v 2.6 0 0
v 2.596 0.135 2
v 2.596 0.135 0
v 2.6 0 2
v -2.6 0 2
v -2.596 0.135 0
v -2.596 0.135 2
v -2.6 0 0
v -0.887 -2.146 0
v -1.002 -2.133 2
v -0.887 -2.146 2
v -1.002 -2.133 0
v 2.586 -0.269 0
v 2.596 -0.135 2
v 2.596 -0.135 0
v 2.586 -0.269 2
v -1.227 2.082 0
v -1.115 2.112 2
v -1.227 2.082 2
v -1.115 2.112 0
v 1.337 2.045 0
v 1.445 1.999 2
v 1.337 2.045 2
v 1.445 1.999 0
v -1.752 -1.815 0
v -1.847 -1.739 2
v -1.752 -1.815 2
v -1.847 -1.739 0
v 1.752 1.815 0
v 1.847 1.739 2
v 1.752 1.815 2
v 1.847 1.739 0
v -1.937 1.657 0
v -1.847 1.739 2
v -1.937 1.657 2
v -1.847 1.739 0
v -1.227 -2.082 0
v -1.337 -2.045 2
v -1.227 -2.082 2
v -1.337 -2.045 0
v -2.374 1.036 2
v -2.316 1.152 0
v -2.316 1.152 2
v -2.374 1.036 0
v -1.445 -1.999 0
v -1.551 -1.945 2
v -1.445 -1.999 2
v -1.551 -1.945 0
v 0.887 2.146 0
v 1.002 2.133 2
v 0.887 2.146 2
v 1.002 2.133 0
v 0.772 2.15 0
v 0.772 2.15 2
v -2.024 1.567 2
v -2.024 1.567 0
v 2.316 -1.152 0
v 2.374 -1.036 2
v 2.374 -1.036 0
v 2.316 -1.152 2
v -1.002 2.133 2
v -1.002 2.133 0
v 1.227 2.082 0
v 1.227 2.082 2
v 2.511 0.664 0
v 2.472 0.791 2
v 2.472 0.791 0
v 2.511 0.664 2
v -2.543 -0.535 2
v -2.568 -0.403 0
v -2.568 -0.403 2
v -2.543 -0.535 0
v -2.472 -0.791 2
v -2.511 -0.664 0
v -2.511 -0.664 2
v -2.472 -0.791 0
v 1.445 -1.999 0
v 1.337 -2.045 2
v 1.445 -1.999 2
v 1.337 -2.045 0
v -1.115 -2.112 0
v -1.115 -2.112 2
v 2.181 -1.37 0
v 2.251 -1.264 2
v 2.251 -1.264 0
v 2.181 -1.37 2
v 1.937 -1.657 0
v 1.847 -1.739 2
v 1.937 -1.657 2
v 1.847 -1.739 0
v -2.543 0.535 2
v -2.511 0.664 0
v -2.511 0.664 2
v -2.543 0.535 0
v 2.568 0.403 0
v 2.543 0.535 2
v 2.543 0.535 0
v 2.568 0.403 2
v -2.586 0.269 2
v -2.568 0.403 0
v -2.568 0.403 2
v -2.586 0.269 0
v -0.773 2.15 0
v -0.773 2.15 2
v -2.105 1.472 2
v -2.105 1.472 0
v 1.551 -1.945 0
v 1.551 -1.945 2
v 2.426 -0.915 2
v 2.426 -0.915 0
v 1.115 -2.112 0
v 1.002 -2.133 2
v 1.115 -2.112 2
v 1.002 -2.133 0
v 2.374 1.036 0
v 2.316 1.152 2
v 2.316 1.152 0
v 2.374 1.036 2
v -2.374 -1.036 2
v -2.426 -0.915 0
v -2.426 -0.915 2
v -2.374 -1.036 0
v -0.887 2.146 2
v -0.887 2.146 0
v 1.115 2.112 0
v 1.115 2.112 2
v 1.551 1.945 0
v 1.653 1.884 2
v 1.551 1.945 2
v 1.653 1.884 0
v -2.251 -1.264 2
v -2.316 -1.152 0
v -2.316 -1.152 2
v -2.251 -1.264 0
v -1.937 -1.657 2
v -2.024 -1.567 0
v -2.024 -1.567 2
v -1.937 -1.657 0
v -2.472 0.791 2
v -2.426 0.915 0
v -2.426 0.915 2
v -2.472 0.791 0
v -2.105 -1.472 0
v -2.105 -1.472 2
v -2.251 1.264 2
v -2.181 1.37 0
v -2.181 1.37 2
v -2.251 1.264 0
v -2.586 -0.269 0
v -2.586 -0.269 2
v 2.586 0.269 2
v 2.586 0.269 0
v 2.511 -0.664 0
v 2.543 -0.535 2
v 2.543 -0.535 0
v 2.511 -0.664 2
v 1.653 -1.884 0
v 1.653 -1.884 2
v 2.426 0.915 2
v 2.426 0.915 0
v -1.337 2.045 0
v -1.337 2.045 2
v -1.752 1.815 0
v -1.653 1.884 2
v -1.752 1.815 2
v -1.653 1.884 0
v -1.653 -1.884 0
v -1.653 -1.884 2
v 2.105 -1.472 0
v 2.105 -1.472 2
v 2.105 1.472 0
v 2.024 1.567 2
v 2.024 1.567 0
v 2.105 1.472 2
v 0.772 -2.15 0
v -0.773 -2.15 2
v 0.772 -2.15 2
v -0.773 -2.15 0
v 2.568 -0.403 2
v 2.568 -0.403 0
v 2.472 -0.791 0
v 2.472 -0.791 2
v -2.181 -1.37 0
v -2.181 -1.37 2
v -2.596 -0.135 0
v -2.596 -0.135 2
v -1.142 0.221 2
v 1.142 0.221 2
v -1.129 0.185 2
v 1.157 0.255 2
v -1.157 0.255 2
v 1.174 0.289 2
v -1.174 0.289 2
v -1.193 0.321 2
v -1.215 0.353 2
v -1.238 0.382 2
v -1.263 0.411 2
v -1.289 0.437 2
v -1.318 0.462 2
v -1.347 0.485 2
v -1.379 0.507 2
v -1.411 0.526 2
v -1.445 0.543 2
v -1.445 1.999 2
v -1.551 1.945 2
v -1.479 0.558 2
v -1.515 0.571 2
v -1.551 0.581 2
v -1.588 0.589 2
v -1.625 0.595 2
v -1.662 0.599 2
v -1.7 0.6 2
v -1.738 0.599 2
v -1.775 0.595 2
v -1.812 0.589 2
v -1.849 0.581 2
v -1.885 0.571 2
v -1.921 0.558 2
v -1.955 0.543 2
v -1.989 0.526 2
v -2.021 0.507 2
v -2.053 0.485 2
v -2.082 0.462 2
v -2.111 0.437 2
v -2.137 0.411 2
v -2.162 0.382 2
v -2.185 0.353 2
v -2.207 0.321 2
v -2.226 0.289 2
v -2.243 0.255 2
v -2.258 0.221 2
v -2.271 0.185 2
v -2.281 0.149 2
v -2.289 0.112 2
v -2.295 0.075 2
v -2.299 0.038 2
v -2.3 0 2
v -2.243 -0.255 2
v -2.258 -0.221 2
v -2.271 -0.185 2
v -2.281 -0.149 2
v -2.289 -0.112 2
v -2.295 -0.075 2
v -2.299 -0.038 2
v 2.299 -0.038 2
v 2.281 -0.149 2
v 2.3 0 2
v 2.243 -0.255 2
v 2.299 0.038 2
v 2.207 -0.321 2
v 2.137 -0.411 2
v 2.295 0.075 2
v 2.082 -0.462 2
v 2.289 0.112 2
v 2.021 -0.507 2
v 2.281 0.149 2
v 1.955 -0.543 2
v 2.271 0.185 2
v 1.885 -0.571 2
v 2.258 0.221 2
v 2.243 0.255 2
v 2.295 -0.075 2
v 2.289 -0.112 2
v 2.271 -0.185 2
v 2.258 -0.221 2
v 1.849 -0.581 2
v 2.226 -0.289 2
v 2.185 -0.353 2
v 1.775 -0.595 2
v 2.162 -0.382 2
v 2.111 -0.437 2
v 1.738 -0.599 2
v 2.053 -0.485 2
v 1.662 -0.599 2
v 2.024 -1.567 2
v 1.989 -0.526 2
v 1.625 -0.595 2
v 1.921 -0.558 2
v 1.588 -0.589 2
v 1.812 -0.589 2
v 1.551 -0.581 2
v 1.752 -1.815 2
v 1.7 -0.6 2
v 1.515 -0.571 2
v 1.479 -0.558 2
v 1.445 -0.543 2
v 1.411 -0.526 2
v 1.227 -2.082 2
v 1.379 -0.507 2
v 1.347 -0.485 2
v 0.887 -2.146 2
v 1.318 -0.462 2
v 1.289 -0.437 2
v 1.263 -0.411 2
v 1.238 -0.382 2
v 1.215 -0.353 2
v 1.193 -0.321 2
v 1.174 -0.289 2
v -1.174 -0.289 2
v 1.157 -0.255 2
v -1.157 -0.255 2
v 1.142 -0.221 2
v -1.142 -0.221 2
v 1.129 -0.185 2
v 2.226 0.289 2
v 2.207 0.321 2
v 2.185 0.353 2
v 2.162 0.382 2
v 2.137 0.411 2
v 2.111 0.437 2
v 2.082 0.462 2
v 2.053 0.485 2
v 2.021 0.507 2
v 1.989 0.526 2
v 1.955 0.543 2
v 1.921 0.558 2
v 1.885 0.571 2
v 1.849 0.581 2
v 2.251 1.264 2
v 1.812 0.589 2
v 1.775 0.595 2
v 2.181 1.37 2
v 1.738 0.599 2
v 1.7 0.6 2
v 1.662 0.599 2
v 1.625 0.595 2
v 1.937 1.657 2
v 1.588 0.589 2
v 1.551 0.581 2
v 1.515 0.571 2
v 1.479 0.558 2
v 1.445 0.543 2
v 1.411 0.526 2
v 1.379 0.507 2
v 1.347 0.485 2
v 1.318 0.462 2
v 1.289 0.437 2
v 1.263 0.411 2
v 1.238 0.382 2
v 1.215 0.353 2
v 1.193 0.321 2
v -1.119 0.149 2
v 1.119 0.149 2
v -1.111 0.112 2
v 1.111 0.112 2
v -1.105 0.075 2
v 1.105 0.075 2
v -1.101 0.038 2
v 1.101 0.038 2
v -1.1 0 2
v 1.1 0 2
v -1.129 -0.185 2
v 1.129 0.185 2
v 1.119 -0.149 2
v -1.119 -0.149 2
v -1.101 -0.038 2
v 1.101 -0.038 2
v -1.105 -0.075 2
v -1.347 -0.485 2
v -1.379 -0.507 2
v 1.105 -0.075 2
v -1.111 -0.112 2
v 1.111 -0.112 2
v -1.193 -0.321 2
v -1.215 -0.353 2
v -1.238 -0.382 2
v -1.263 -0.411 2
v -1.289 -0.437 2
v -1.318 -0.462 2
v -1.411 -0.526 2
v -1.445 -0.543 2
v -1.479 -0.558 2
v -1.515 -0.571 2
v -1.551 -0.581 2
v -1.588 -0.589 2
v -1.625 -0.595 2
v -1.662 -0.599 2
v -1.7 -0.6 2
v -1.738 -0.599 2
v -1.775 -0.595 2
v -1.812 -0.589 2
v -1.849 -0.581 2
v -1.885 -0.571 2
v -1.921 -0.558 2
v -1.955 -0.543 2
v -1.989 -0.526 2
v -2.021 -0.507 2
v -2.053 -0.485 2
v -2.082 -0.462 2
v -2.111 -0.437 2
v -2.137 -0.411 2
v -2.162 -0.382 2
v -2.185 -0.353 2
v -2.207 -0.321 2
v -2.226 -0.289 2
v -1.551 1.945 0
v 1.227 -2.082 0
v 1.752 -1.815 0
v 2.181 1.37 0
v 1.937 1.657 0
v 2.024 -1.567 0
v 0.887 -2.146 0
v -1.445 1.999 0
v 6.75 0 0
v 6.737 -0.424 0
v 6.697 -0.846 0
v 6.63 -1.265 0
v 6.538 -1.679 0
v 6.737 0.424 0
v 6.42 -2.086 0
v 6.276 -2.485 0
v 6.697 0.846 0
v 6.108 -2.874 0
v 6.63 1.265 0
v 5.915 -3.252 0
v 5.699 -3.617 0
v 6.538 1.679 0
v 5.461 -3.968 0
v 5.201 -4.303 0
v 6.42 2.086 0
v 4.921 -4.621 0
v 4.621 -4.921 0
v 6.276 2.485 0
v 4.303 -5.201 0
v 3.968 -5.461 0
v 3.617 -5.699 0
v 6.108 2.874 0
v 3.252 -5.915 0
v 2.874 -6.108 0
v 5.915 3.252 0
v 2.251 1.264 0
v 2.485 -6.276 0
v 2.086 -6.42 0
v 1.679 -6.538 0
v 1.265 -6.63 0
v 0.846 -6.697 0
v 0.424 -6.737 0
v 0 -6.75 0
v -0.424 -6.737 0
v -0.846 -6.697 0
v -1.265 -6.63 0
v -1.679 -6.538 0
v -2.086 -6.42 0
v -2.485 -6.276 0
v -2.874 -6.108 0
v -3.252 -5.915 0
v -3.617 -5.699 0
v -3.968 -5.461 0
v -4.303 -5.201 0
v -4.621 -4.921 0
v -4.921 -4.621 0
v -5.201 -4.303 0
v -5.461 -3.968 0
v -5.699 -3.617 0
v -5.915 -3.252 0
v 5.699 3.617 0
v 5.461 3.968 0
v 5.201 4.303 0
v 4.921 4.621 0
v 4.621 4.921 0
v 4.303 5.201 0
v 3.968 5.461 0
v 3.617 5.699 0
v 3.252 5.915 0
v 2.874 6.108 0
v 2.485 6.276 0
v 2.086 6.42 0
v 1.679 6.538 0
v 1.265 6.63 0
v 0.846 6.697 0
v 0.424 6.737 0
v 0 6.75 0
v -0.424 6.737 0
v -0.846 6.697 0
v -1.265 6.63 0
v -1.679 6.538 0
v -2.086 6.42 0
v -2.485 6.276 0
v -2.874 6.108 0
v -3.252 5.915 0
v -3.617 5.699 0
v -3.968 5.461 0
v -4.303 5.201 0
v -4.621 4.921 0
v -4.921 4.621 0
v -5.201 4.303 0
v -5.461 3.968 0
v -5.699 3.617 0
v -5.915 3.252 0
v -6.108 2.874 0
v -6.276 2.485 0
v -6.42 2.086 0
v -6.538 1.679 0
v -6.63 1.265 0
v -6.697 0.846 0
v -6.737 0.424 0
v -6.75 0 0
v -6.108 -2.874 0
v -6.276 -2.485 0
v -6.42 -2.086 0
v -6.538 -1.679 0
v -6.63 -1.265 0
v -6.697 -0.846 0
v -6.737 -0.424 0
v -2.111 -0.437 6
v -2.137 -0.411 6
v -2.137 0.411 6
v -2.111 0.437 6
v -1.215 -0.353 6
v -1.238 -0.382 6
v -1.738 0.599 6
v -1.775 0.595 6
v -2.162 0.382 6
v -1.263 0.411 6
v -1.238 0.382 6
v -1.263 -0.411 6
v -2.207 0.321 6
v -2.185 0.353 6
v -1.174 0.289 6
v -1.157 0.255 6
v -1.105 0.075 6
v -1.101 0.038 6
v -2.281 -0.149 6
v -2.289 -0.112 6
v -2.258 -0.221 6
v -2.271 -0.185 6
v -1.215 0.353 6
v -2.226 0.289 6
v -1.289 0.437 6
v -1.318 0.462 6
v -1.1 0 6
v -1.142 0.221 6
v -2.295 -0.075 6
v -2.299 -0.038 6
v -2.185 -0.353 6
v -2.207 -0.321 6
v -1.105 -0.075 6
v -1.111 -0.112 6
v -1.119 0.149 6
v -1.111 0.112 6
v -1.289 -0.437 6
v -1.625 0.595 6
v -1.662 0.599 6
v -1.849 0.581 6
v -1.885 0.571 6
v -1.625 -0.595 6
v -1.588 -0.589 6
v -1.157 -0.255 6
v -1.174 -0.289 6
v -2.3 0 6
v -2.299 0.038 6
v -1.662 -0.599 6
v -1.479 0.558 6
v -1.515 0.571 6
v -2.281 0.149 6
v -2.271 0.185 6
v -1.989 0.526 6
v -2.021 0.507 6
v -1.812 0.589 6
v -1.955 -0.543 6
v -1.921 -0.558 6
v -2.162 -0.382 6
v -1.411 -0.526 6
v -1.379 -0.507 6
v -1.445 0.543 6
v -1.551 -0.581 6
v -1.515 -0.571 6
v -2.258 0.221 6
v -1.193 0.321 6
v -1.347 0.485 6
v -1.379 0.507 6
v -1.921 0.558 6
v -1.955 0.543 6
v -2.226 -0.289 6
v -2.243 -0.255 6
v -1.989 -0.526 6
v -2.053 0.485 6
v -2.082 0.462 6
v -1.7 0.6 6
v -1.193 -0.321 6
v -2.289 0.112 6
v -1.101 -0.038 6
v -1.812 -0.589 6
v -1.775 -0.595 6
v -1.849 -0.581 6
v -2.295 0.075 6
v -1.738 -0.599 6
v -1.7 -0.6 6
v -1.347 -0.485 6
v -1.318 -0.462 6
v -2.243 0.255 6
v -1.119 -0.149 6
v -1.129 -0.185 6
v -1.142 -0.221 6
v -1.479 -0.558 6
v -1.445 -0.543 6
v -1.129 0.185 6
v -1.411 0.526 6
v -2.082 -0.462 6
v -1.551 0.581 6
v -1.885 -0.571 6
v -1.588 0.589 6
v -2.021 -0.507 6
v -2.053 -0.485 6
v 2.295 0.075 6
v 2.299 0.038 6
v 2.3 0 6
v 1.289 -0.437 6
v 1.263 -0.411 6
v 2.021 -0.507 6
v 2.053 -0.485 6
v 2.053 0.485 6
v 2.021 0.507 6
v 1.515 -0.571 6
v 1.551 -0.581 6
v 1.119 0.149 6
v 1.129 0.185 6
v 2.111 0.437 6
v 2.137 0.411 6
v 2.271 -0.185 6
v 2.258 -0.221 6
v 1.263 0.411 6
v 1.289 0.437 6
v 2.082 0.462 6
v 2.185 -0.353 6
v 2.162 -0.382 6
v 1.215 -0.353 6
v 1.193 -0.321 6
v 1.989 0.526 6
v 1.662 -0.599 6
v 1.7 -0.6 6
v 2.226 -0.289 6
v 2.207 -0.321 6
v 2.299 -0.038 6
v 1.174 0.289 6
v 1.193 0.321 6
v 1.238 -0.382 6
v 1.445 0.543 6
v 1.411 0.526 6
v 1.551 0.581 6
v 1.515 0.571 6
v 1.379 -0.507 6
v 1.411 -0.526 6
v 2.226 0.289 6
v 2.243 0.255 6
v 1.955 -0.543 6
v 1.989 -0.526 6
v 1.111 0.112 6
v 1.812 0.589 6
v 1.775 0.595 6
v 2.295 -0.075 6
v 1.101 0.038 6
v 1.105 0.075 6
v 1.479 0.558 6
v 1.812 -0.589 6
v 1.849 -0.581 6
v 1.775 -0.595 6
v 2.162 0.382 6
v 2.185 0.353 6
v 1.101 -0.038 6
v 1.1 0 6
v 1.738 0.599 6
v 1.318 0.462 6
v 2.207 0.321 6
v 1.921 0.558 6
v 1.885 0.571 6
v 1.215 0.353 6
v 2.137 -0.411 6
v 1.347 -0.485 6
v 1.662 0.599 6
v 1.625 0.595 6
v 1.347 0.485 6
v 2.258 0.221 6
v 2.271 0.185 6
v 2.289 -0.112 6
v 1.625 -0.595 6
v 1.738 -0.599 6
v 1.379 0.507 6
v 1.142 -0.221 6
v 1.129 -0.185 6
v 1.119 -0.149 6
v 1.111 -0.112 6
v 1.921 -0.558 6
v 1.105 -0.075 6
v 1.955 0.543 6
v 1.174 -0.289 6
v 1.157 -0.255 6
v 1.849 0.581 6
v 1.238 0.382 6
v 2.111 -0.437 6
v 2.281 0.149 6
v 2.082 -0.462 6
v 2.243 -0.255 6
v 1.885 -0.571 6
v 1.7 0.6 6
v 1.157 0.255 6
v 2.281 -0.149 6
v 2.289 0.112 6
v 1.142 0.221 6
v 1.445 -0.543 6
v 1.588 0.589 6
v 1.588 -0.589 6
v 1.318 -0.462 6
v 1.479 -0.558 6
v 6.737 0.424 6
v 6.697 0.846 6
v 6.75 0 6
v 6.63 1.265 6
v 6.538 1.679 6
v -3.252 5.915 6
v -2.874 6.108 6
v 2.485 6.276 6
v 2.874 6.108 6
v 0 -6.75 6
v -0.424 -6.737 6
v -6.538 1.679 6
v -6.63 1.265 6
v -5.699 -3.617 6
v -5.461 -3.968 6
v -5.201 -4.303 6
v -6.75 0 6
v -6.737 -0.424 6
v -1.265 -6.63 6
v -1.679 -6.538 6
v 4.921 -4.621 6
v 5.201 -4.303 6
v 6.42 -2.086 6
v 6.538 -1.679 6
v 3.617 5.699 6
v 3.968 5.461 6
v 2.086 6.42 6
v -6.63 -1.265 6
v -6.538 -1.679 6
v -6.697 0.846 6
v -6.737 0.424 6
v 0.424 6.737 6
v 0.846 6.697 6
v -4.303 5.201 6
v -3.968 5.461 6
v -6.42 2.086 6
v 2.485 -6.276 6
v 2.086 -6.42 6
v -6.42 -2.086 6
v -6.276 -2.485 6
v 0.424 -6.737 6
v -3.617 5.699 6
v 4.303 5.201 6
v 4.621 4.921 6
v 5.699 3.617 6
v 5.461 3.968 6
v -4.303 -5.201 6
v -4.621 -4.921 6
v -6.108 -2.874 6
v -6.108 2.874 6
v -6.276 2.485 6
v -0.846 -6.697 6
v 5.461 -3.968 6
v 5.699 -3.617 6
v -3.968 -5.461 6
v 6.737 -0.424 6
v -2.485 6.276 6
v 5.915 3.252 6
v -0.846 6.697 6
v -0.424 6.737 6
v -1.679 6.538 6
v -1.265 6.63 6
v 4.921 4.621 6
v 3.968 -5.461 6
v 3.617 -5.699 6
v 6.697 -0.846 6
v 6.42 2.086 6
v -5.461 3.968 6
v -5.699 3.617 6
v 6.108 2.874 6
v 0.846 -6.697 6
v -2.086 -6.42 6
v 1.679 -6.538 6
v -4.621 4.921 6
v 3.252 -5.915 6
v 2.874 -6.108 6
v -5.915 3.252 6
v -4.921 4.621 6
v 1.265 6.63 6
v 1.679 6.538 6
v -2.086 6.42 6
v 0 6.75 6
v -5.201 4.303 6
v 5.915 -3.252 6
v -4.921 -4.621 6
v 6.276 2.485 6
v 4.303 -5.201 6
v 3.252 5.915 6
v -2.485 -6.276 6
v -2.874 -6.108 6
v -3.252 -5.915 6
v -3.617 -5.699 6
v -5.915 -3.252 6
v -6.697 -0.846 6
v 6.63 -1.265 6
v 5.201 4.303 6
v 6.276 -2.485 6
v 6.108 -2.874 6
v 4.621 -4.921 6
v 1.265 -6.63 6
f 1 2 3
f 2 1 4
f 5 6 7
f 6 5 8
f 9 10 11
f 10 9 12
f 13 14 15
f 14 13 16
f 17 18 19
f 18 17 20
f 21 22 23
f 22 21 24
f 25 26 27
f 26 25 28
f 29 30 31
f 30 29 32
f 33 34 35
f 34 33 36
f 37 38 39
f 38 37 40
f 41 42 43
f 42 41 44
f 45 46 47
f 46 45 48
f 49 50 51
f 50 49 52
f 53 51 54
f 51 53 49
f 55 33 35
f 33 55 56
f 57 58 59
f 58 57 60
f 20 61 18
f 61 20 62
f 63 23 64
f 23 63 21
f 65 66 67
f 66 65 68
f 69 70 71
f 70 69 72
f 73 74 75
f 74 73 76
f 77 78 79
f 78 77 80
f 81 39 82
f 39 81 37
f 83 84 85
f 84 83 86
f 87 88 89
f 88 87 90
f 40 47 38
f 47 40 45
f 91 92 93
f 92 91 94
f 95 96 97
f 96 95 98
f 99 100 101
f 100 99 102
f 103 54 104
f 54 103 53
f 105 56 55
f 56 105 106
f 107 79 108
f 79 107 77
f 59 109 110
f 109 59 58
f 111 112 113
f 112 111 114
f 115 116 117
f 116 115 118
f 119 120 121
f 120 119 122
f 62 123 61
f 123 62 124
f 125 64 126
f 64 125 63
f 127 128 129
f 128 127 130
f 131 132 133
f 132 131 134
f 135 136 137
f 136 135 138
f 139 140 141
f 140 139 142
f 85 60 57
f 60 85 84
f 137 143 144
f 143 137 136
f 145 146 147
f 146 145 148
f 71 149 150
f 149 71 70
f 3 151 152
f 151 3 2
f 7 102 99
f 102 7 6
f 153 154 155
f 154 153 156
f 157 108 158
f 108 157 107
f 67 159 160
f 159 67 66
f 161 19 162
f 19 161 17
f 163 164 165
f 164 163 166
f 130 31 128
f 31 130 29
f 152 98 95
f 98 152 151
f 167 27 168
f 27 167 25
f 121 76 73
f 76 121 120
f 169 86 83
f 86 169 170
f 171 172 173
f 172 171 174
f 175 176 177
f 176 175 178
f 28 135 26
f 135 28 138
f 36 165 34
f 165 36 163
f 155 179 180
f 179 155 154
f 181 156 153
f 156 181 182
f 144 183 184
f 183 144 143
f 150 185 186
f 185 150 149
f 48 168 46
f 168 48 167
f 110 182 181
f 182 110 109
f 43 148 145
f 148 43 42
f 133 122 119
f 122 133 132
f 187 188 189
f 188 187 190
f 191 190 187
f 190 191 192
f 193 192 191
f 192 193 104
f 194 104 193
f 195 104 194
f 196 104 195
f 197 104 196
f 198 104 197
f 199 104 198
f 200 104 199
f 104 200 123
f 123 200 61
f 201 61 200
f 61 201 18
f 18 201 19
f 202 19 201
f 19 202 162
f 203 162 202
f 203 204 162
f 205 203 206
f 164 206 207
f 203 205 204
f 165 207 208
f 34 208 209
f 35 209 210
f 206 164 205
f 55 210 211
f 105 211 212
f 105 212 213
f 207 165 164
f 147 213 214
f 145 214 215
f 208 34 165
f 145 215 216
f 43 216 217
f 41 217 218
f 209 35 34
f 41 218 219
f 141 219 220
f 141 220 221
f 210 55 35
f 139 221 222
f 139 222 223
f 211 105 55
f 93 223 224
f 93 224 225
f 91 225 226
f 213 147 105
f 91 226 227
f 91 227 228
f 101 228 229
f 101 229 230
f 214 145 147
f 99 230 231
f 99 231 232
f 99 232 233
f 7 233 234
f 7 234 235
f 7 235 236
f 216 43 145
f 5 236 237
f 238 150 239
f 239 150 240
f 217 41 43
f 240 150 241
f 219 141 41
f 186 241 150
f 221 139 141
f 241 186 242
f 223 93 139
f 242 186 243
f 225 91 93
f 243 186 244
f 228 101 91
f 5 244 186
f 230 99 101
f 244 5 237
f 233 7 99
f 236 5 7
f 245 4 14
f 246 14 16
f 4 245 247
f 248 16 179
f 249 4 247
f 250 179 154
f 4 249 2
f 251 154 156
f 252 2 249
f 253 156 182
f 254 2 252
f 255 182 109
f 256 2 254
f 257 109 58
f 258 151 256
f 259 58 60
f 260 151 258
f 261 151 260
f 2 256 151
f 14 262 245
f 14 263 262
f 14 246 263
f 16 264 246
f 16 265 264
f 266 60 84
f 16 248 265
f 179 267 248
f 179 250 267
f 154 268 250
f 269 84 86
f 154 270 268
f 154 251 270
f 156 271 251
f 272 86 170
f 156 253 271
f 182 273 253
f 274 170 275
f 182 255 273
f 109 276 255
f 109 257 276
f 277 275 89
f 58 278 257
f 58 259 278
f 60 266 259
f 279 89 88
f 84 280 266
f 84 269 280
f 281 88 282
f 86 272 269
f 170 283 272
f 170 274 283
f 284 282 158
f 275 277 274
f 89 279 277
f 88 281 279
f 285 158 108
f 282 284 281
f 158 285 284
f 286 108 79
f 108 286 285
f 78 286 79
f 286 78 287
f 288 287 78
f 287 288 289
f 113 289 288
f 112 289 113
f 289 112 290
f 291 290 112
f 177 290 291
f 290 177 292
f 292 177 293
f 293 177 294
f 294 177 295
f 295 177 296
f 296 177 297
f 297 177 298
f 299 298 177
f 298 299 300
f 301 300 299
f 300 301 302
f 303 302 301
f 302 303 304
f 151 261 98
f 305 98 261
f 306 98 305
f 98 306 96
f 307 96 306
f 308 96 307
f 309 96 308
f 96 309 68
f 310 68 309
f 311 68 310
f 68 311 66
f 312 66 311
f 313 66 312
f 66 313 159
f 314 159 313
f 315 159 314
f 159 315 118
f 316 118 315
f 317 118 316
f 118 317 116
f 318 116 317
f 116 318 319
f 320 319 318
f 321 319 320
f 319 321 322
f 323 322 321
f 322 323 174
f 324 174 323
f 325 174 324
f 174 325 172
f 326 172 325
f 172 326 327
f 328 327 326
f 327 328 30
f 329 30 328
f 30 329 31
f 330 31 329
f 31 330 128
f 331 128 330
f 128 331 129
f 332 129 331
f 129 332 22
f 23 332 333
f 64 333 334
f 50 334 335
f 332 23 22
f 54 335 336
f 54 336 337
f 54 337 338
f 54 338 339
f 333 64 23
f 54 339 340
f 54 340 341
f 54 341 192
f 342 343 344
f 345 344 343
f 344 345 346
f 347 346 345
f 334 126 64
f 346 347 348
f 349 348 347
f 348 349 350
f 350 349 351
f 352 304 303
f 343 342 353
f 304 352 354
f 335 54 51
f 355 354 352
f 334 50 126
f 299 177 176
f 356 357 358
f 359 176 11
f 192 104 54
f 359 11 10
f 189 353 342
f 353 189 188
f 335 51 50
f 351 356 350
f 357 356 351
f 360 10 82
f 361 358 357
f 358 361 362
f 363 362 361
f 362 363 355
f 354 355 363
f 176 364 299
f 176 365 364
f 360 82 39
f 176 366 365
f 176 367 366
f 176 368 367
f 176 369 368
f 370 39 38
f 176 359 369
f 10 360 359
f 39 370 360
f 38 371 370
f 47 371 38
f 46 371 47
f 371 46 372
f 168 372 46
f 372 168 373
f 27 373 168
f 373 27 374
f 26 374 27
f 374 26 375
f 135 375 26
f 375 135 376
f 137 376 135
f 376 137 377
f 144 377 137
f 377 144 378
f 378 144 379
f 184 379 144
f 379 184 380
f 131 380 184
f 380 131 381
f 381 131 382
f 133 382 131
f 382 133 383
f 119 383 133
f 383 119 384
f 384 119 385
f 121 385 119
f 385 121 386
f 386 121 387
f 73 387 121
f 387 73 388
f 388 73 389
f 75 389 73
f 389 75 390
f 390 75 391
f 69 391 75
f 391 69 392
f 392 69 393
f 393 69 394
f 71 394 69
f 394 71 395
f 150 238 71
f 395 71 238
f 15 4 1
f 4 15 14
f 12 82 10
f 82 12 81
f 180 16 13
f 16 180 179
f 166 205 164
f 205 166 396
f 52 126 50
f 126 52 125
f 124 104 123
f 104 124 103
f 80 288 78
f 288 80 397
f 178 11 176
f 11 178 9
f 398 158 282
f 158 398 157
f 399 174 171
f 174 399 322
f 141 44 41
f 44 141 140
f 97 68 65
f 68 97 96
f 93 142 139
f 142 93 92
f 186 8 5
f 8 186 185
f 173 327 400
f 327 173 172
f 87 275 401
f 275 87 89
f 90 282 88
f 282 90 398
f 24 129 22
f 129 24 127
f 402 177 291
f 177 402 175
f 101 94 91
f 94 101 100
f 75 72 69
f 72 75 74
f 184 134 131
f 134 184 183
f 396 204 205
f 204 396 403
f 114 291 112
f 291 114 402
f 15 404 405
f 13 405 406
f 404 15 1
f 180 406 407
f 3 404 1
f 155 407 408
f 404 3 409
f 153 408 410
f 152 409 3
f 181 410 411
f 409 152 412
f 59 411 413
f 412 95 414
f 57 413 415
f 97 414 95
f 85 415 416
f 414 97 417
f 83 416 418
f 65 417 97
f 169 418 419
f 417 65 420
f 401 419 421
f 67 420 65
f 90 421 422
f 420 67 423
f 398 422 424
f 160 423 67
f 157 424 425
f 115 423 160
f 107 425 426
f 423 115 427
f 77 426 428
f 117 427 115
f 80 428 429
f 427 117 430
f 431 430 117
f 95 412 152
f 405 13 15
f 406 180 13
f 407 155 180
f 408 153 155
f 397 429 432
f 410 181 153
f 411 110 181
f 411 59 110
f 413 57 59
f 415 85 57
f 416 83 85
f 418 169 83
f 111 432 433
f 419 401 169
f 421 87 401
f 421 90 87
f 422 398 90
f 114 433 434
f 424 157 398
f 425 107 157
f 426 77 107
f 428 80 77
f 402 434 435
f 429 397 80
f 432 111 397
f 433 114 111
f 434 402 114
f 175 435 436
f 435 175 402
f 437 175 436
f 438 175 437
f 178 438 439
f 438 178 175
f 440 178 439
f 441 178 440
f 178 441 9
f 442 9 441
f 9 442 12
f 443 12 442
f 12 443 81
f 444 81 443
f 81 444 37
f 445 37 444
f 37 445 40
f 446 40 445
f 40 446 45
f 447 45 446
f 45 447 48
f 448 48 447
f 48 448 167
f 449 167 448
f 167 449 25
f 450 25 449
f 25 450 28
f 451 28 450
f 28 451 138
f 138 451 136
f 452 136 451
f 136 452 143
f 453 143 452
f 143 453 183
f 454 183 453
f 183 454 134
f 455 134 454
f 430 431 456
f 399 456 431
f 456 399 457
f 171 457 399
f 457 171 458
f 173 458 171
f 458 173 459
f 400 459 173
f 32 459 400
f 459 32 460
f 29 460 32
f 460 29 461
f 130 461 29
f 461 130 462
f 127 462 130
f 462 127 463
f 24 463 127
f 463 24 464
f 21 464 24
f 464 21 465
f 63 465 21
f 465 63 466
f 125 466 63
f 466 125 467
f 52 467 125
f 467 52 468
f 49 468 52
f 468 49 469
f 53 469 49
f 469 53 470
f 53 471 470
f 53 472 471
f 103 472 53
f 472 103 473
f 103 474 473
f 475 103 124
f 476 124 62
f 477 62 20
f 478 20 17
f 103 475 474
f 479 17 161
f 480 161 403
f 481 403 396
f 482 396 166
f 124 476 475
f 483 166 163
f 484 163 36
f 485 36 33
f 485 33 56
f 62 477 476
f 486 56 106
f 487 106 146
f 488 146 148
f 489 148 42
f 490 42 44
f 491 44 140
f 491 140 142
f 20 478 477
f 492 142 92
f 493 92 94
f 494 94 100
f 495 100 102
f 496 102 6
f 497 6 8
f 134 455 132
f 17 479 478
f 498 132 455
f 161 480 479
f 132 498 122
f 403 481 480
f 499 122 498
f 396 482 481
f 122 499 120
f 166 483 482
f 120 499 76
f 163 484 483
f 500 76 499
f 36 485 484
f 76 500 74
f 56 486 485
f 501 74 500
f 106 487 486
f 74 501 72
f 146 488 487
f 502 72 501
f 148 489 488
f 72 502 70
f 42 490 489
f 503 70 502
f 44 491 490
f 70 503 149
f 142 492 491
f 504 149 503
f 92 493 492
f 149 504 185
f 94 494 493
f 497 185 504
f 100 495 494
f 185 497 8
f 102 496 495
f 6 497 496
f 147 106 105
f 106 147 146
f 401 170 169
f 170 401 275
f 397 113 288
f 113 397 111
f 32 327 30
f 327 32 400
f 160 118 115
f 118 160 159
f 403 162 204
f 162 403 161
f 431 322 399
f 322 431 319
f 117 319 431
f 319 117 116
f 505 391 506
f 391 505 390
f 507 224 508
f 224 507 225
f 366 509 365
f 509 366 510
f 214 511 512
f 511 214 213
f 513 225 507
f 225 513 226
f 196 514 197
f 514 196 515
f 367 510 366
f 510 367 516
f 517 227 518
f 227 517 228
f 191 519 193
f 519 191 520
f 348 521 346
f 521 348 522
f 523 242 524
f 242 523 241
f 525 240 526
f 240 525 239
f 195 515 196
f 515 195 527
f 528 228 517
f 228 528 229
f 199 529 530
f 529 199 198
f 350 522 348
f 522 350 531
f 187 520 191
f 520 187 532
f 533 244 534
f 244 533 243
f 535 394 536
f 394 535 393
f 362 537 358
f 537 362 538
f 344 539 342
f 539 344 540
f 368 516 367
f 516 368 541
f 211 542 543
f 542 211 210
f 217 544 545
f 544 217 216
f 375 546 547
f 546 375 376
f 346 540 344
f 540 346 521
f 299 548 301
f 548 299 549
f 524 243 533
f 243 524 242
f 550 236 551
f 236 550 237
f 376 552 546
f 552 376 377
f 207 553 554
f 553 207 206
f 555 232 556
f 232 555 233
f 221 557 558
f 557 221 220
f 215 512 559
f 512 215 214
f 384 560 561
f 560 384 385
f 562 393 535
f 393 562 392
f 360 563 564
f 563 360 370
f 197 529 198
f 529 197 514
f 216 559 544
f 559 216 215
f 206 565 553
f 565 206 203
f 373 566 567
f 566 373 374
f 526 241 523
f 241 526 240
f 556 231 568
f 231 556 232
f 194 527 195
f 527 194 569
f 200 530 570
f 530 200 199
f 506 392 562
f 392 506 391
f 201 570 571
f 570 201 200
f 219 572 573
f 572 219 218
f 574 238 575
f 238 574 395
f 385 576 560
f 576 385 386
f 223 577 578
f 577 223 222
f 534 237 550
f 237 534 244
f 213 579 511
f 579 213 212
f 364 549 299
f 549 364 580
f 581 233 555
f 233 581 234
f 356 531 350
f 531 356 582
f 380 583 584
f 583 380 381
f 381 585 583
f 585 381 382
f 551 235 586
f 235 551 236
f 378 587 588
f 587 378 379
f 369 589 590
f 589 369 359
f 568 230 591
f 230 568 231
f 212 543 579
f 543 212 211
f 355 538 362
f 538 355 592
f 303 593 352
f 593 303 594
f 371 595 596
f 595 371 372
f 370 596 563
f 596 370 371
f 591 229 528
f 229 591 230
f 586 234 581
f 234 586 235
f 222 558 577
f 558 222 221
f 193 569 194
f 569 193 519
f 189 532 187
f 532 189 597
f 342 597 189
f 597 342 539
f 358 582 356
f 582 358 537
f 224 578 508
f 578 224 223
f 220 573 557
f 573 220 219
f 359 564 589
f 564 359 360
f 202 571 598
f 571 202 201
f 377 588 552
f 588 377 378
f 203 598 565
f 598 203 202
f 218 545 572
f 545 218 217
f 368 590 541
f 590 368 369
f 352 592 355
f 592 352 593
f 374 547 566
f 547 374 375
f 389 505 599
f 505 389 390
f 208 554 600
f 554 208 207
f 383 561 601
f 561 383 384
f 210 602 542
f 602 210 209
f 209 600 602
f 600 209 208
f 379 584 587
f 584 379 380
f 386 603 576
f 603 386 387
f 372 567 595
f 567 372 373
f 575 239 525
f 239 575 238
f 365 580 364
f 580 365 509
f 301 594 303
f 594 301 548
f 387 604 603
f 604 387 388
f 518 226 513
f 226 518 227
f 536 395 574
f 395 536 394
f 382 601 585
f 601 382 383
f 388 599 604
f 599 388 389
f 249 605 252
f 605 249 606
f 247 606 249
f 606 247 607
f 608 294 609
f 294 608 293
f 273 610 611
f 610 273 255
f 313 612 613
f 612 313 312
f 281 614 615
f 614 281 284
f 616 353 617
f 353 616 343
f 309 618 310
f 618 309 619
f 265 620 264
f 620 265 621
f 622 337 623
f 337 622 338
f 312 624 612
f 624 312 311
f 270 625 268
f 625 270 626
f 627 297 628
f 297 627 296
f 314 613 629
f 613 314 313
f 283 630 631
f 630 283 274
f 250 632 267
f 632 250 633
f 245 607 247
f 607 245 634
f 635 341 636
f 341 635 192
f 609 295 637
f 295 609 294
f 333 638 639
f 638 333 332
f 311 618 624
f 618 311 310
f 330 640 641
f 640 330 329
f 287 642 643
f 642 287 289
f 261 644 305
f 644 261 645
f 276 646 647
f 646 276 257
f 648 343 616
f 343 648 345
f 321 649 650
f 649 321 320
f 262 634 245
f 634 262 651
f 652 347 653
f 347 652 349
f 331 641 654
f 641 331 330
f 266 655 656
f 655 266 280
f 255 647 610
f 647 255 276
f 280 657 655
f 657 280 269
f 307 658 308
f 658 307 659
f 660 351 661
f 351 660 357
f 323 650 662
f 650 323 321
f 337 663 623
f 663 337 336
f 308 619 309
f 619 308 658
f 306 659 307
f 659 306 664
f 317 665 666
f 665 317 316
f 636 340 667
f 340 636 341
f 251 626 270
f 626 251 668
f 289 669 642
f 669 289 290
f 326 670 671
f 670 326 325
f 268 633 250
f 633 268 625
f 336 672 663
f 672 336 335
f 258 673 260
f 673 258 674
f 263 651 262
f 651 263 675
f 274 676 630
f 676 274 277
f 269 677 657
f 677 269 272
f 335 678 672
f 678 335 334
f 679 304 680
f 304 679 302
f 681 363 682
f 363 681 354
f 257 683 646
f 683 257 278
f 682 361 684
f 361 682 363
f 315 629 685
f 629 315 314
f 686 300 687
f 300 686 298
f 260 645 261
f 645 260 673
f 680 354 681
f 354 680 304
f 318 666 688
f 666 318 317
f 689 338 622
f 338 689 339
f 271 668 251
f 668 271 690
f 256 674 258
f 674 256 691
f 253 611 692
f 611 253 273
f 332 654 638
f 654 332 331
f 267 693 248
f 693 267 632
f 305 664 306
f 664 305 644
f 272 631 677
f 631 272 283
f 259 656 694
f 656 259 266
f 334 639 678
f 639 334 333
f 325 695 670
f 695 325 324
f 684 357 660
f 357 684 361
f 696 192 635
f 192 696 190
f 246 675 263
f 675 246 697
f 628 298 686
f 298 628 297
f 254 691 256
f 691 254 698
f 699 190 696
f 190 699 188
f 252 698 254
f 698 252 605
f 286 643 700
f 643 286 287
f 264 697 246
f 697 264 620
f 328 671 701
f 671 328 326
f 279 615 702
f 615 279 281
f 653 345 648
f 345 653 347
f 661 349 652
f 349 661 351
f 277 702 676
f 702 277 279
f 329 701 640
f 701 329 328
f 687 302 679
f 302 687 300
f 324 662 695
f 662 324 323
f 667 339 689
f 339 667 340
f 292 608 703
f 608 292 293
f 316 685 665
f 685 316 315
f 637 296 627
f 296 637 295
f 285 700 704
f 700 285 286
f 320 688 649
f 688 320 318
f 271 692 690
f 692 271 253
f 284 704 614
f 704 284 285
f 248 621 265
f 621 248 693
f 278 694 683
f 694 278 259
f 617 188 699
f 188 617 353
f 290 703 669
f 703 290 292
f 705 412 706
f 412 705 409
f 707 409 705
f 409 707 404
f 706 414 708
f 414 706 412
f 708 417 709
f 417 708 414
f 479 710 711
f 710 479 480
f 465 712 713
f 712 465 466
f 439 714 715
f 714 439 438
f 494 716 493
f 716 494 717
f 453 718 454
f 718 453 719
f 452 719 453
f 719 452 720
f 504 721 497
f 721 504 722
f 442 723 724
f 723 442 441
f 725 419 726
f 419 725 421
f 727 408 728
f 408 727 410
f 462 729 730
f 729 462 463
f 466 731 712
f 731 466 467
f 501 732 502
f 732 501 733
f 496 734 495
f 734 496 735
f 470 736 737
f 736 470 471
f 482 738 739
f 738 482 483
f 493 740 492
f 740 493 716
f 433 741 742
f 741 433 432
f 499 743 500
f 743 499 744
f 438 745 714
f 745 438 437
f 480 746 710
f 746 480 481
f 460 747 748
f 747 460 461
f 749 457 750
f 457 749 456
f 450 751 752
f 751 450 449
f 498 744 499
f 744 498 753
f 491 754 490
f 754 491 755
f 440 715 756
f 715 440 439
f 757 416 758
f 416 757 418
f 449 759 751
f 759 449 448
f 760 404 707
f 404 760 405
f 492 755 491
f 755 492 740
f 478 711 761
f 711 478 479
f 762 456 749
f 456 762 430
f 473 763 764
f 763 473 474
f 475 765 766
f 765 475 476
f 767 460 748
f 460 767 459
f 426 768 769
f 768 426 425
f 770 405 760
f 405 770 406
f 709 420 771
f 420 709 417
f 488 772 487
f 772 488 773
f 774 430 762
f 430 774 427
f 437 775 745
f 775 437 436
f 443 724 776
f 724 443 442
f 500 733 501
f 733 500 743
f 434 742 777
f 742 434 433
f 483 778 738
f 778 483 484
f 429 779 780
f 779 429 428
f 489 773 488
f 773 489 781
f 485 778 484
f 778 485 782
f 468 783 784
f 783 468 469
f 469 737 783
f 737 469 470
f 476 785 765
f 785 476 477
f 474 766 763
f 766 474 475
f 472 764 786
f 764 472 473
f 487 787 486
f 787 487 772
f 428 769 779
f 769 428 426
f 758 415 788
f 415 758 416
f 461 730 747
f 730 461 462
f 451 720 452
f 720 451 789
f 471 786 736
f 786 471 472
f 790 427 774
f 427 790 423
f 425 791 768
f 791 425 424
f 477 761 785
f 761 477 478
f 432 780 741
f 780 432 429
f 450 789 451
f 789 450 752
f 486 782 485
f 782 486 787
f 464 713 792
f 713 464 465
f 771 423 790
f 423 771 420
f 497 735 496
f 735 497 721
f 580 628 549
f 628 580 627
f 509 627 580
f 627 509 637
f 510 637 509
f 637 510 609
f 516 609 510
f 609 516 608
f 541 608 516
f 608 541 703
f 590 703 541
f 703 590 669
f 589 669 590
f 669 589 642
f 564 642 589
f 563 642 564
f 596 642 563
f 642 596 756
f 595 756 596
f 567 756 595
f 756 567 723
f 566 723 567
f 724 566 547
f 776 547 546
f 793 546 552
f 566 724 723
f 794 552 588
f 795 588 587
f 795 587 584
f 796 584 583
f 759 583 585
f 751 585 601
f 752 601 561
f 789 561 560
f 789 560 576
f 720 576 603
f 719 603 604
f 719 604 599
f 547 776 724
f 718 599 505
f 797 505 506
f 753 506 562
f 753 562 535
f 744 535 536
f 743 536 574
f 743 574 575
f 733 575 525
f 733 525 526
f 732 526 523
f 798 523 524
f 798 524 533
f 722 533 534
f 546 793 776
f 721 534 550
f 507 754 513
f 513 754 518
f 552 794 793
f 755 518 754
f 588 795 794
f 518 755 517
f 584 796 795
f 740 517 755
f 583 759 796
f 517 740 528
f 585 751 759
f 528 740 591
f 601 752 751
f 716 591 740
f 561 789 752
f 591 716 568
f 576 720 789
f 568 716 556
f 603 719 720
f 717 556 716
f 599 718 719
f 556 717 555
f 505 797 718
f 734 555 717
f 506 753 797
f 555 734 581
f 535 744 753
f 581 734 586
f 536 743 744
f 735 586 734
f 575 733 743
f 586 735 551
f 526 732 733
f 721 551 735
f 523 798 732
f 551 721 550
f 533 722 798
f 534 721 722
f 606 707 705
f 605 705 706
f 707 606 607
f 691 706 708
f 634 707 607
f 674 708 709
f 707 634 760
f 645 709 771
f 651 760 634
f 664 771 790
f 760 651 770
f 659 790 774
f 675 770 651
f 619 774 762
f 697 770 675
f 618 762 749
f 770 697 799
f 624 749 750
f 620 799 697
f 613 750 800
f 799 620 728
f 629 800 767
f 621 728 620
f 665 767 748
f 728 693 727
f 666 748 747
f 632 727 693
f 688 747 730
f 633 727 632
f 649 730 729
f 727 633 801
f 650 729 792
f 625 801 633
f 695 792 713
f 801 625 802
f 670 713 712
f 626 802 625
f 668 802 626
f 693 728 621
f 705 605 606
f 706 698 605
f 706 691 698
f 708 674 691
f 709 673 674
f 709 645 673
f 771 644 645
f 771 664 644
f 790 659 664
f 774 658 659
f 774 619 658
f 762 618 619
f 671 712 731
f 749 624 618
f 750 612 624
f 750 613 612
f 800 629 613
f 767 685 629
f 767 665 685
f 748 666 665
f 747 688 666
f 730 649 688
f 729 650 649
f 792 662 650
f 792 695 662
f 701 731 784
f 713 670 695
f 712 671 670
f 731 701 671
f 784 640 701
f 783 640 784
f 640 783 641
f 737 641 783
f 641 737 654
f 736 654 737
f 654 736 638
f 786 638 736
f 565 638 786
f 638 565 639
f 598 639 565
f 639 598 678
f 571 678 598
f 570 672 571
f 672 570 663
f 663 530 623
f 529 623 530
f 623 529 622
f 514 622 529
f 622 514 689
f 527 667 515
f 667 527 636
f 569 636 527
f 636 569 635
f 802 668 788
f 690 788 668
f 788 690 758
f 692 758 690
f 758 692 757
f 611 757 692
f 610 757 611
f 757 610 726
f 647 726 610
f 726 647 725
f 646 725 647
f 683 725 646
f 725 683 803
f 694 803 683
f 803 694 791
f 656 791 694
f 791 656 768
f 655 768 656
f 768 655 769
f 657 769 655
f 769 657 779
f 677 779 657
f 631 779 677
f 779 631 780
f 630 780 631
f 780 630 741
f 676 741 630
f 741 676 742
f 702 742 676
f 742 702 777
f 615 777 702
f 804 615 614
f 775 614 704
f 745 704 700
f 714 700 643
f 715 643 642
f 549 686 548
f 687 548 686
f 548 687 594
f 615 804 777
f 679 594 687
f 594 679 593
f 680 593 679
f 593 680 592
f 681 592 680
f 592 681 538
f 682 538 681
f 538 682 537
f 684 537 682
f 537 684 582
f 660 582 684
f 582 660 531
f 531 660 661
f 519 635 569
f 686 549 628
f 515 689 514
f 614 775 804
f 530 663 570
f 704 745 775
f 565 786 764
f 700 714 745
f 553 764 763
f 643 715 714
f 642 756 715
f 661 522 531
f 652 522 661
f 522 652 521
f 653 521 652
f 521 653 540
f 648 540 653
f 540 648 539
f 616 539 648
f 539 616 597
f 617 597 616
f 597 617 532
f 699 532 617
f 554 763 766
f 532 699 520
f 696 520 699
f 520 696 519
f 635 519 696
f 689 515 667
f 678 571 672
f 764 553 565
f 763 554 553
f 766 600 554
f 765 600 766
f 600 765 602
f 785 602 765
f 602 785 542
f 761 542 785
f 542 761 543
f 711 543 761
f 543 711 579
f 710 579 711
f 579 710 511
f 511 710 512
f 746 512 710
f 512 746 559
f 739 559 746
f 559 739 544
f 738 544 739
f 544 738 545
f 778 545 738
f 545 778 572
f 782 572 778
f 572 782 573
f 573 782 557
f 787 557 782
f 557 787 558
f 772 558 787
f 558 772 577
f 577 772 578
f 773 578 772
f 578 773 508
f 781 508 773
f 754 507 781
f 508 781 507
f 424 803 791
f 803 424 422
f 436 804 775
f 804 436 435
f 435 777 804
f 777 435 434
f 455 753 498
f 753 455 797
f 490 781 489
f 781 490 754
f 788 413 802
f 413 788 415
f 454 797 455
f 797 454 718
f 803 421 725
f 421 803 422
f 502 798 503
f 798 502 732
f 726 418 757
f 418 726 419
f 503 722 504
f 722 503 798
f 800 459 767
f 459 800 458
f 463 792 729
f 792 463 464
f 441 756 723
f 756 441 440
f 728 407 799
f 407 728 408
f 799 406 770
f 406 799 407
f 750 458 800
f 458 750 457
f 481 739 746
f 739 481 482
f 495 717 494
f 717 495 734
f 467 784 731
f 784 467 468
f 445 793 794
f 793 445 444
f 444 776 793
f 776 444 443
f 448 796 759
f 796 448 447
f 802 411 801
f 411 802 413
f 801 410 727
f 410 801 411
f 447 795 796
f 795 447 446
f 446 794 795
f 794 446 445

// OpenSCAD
$fn=100;

// Metric pipe system refers to *outside* diameter
// Wall thickness of 15mm pipe is 0.7mm so internal diameter is (15 - (0.7 x 2 )) = 13.6mm
// Wall thickness of 22mm pipe is 0.9mm so internal diameter is 20.2mm
// Imperial pipe system refers to *inside* diameter
// 1/2" pipe has an internal diameter of 12.7mm
// 3/4" pipe internal diameter is 19.05 mm.

// When pipes get cut, the edges tend to get squished inwards, so you might
// want to reduce diameter slightly
pipe_inside_diameter = 13.5;

mount_height = 6;

// width, height, depth, distance between pins
ldr_dimensions = [5.2,4.3,2,3.4];
// diameter, depth, distance between pins
led_dimensions = [5.9,3,2.54]; // 5mm LED is 5.9mm including base

difference(){
  cylinder(d=pipe_inside_diameter, h=mount_height);
  ldr();
}

module ldr() {
  translate([-ldr_dimensions[0]/2,0,0]){
    scale = .85;
    linear_extrude(ldr_dimensions[2]){
      hull(){
        translate([ldr_dimensions[1]/2*scale,0,0])
          scale([scale,1,1])
            circle(d=ldr_dimensions[1]);
        translate([ldr_dimensions[0]-ldr_dimensions[1]*scale/2,0,0])
          scale([scale,1,1])
            circle(d=ldr_dimensions[1]);
      }
    }
    translate([ldr_dimensions[0]/2-ldr_dimensions[3]/2,0,0])
      cylinder(r=0.6, h=30);
    translate([ldr_dimensions[0]/2+ldr_dimensions[3]/2,0,0])
      cylinder(r=0.6, h=30);
  }
}


module led() {
  linear_extrude(led_dimensions[1]){
    circle(d=led_dimensions[0]);
  }
  translate([-led_dimensions[2]/2,0,0])
    cylinder(r=0.6, h=20);
  translate([led_dimensions[2]/2,0,0])
    cylinder(r=0.6, h=20);
}
